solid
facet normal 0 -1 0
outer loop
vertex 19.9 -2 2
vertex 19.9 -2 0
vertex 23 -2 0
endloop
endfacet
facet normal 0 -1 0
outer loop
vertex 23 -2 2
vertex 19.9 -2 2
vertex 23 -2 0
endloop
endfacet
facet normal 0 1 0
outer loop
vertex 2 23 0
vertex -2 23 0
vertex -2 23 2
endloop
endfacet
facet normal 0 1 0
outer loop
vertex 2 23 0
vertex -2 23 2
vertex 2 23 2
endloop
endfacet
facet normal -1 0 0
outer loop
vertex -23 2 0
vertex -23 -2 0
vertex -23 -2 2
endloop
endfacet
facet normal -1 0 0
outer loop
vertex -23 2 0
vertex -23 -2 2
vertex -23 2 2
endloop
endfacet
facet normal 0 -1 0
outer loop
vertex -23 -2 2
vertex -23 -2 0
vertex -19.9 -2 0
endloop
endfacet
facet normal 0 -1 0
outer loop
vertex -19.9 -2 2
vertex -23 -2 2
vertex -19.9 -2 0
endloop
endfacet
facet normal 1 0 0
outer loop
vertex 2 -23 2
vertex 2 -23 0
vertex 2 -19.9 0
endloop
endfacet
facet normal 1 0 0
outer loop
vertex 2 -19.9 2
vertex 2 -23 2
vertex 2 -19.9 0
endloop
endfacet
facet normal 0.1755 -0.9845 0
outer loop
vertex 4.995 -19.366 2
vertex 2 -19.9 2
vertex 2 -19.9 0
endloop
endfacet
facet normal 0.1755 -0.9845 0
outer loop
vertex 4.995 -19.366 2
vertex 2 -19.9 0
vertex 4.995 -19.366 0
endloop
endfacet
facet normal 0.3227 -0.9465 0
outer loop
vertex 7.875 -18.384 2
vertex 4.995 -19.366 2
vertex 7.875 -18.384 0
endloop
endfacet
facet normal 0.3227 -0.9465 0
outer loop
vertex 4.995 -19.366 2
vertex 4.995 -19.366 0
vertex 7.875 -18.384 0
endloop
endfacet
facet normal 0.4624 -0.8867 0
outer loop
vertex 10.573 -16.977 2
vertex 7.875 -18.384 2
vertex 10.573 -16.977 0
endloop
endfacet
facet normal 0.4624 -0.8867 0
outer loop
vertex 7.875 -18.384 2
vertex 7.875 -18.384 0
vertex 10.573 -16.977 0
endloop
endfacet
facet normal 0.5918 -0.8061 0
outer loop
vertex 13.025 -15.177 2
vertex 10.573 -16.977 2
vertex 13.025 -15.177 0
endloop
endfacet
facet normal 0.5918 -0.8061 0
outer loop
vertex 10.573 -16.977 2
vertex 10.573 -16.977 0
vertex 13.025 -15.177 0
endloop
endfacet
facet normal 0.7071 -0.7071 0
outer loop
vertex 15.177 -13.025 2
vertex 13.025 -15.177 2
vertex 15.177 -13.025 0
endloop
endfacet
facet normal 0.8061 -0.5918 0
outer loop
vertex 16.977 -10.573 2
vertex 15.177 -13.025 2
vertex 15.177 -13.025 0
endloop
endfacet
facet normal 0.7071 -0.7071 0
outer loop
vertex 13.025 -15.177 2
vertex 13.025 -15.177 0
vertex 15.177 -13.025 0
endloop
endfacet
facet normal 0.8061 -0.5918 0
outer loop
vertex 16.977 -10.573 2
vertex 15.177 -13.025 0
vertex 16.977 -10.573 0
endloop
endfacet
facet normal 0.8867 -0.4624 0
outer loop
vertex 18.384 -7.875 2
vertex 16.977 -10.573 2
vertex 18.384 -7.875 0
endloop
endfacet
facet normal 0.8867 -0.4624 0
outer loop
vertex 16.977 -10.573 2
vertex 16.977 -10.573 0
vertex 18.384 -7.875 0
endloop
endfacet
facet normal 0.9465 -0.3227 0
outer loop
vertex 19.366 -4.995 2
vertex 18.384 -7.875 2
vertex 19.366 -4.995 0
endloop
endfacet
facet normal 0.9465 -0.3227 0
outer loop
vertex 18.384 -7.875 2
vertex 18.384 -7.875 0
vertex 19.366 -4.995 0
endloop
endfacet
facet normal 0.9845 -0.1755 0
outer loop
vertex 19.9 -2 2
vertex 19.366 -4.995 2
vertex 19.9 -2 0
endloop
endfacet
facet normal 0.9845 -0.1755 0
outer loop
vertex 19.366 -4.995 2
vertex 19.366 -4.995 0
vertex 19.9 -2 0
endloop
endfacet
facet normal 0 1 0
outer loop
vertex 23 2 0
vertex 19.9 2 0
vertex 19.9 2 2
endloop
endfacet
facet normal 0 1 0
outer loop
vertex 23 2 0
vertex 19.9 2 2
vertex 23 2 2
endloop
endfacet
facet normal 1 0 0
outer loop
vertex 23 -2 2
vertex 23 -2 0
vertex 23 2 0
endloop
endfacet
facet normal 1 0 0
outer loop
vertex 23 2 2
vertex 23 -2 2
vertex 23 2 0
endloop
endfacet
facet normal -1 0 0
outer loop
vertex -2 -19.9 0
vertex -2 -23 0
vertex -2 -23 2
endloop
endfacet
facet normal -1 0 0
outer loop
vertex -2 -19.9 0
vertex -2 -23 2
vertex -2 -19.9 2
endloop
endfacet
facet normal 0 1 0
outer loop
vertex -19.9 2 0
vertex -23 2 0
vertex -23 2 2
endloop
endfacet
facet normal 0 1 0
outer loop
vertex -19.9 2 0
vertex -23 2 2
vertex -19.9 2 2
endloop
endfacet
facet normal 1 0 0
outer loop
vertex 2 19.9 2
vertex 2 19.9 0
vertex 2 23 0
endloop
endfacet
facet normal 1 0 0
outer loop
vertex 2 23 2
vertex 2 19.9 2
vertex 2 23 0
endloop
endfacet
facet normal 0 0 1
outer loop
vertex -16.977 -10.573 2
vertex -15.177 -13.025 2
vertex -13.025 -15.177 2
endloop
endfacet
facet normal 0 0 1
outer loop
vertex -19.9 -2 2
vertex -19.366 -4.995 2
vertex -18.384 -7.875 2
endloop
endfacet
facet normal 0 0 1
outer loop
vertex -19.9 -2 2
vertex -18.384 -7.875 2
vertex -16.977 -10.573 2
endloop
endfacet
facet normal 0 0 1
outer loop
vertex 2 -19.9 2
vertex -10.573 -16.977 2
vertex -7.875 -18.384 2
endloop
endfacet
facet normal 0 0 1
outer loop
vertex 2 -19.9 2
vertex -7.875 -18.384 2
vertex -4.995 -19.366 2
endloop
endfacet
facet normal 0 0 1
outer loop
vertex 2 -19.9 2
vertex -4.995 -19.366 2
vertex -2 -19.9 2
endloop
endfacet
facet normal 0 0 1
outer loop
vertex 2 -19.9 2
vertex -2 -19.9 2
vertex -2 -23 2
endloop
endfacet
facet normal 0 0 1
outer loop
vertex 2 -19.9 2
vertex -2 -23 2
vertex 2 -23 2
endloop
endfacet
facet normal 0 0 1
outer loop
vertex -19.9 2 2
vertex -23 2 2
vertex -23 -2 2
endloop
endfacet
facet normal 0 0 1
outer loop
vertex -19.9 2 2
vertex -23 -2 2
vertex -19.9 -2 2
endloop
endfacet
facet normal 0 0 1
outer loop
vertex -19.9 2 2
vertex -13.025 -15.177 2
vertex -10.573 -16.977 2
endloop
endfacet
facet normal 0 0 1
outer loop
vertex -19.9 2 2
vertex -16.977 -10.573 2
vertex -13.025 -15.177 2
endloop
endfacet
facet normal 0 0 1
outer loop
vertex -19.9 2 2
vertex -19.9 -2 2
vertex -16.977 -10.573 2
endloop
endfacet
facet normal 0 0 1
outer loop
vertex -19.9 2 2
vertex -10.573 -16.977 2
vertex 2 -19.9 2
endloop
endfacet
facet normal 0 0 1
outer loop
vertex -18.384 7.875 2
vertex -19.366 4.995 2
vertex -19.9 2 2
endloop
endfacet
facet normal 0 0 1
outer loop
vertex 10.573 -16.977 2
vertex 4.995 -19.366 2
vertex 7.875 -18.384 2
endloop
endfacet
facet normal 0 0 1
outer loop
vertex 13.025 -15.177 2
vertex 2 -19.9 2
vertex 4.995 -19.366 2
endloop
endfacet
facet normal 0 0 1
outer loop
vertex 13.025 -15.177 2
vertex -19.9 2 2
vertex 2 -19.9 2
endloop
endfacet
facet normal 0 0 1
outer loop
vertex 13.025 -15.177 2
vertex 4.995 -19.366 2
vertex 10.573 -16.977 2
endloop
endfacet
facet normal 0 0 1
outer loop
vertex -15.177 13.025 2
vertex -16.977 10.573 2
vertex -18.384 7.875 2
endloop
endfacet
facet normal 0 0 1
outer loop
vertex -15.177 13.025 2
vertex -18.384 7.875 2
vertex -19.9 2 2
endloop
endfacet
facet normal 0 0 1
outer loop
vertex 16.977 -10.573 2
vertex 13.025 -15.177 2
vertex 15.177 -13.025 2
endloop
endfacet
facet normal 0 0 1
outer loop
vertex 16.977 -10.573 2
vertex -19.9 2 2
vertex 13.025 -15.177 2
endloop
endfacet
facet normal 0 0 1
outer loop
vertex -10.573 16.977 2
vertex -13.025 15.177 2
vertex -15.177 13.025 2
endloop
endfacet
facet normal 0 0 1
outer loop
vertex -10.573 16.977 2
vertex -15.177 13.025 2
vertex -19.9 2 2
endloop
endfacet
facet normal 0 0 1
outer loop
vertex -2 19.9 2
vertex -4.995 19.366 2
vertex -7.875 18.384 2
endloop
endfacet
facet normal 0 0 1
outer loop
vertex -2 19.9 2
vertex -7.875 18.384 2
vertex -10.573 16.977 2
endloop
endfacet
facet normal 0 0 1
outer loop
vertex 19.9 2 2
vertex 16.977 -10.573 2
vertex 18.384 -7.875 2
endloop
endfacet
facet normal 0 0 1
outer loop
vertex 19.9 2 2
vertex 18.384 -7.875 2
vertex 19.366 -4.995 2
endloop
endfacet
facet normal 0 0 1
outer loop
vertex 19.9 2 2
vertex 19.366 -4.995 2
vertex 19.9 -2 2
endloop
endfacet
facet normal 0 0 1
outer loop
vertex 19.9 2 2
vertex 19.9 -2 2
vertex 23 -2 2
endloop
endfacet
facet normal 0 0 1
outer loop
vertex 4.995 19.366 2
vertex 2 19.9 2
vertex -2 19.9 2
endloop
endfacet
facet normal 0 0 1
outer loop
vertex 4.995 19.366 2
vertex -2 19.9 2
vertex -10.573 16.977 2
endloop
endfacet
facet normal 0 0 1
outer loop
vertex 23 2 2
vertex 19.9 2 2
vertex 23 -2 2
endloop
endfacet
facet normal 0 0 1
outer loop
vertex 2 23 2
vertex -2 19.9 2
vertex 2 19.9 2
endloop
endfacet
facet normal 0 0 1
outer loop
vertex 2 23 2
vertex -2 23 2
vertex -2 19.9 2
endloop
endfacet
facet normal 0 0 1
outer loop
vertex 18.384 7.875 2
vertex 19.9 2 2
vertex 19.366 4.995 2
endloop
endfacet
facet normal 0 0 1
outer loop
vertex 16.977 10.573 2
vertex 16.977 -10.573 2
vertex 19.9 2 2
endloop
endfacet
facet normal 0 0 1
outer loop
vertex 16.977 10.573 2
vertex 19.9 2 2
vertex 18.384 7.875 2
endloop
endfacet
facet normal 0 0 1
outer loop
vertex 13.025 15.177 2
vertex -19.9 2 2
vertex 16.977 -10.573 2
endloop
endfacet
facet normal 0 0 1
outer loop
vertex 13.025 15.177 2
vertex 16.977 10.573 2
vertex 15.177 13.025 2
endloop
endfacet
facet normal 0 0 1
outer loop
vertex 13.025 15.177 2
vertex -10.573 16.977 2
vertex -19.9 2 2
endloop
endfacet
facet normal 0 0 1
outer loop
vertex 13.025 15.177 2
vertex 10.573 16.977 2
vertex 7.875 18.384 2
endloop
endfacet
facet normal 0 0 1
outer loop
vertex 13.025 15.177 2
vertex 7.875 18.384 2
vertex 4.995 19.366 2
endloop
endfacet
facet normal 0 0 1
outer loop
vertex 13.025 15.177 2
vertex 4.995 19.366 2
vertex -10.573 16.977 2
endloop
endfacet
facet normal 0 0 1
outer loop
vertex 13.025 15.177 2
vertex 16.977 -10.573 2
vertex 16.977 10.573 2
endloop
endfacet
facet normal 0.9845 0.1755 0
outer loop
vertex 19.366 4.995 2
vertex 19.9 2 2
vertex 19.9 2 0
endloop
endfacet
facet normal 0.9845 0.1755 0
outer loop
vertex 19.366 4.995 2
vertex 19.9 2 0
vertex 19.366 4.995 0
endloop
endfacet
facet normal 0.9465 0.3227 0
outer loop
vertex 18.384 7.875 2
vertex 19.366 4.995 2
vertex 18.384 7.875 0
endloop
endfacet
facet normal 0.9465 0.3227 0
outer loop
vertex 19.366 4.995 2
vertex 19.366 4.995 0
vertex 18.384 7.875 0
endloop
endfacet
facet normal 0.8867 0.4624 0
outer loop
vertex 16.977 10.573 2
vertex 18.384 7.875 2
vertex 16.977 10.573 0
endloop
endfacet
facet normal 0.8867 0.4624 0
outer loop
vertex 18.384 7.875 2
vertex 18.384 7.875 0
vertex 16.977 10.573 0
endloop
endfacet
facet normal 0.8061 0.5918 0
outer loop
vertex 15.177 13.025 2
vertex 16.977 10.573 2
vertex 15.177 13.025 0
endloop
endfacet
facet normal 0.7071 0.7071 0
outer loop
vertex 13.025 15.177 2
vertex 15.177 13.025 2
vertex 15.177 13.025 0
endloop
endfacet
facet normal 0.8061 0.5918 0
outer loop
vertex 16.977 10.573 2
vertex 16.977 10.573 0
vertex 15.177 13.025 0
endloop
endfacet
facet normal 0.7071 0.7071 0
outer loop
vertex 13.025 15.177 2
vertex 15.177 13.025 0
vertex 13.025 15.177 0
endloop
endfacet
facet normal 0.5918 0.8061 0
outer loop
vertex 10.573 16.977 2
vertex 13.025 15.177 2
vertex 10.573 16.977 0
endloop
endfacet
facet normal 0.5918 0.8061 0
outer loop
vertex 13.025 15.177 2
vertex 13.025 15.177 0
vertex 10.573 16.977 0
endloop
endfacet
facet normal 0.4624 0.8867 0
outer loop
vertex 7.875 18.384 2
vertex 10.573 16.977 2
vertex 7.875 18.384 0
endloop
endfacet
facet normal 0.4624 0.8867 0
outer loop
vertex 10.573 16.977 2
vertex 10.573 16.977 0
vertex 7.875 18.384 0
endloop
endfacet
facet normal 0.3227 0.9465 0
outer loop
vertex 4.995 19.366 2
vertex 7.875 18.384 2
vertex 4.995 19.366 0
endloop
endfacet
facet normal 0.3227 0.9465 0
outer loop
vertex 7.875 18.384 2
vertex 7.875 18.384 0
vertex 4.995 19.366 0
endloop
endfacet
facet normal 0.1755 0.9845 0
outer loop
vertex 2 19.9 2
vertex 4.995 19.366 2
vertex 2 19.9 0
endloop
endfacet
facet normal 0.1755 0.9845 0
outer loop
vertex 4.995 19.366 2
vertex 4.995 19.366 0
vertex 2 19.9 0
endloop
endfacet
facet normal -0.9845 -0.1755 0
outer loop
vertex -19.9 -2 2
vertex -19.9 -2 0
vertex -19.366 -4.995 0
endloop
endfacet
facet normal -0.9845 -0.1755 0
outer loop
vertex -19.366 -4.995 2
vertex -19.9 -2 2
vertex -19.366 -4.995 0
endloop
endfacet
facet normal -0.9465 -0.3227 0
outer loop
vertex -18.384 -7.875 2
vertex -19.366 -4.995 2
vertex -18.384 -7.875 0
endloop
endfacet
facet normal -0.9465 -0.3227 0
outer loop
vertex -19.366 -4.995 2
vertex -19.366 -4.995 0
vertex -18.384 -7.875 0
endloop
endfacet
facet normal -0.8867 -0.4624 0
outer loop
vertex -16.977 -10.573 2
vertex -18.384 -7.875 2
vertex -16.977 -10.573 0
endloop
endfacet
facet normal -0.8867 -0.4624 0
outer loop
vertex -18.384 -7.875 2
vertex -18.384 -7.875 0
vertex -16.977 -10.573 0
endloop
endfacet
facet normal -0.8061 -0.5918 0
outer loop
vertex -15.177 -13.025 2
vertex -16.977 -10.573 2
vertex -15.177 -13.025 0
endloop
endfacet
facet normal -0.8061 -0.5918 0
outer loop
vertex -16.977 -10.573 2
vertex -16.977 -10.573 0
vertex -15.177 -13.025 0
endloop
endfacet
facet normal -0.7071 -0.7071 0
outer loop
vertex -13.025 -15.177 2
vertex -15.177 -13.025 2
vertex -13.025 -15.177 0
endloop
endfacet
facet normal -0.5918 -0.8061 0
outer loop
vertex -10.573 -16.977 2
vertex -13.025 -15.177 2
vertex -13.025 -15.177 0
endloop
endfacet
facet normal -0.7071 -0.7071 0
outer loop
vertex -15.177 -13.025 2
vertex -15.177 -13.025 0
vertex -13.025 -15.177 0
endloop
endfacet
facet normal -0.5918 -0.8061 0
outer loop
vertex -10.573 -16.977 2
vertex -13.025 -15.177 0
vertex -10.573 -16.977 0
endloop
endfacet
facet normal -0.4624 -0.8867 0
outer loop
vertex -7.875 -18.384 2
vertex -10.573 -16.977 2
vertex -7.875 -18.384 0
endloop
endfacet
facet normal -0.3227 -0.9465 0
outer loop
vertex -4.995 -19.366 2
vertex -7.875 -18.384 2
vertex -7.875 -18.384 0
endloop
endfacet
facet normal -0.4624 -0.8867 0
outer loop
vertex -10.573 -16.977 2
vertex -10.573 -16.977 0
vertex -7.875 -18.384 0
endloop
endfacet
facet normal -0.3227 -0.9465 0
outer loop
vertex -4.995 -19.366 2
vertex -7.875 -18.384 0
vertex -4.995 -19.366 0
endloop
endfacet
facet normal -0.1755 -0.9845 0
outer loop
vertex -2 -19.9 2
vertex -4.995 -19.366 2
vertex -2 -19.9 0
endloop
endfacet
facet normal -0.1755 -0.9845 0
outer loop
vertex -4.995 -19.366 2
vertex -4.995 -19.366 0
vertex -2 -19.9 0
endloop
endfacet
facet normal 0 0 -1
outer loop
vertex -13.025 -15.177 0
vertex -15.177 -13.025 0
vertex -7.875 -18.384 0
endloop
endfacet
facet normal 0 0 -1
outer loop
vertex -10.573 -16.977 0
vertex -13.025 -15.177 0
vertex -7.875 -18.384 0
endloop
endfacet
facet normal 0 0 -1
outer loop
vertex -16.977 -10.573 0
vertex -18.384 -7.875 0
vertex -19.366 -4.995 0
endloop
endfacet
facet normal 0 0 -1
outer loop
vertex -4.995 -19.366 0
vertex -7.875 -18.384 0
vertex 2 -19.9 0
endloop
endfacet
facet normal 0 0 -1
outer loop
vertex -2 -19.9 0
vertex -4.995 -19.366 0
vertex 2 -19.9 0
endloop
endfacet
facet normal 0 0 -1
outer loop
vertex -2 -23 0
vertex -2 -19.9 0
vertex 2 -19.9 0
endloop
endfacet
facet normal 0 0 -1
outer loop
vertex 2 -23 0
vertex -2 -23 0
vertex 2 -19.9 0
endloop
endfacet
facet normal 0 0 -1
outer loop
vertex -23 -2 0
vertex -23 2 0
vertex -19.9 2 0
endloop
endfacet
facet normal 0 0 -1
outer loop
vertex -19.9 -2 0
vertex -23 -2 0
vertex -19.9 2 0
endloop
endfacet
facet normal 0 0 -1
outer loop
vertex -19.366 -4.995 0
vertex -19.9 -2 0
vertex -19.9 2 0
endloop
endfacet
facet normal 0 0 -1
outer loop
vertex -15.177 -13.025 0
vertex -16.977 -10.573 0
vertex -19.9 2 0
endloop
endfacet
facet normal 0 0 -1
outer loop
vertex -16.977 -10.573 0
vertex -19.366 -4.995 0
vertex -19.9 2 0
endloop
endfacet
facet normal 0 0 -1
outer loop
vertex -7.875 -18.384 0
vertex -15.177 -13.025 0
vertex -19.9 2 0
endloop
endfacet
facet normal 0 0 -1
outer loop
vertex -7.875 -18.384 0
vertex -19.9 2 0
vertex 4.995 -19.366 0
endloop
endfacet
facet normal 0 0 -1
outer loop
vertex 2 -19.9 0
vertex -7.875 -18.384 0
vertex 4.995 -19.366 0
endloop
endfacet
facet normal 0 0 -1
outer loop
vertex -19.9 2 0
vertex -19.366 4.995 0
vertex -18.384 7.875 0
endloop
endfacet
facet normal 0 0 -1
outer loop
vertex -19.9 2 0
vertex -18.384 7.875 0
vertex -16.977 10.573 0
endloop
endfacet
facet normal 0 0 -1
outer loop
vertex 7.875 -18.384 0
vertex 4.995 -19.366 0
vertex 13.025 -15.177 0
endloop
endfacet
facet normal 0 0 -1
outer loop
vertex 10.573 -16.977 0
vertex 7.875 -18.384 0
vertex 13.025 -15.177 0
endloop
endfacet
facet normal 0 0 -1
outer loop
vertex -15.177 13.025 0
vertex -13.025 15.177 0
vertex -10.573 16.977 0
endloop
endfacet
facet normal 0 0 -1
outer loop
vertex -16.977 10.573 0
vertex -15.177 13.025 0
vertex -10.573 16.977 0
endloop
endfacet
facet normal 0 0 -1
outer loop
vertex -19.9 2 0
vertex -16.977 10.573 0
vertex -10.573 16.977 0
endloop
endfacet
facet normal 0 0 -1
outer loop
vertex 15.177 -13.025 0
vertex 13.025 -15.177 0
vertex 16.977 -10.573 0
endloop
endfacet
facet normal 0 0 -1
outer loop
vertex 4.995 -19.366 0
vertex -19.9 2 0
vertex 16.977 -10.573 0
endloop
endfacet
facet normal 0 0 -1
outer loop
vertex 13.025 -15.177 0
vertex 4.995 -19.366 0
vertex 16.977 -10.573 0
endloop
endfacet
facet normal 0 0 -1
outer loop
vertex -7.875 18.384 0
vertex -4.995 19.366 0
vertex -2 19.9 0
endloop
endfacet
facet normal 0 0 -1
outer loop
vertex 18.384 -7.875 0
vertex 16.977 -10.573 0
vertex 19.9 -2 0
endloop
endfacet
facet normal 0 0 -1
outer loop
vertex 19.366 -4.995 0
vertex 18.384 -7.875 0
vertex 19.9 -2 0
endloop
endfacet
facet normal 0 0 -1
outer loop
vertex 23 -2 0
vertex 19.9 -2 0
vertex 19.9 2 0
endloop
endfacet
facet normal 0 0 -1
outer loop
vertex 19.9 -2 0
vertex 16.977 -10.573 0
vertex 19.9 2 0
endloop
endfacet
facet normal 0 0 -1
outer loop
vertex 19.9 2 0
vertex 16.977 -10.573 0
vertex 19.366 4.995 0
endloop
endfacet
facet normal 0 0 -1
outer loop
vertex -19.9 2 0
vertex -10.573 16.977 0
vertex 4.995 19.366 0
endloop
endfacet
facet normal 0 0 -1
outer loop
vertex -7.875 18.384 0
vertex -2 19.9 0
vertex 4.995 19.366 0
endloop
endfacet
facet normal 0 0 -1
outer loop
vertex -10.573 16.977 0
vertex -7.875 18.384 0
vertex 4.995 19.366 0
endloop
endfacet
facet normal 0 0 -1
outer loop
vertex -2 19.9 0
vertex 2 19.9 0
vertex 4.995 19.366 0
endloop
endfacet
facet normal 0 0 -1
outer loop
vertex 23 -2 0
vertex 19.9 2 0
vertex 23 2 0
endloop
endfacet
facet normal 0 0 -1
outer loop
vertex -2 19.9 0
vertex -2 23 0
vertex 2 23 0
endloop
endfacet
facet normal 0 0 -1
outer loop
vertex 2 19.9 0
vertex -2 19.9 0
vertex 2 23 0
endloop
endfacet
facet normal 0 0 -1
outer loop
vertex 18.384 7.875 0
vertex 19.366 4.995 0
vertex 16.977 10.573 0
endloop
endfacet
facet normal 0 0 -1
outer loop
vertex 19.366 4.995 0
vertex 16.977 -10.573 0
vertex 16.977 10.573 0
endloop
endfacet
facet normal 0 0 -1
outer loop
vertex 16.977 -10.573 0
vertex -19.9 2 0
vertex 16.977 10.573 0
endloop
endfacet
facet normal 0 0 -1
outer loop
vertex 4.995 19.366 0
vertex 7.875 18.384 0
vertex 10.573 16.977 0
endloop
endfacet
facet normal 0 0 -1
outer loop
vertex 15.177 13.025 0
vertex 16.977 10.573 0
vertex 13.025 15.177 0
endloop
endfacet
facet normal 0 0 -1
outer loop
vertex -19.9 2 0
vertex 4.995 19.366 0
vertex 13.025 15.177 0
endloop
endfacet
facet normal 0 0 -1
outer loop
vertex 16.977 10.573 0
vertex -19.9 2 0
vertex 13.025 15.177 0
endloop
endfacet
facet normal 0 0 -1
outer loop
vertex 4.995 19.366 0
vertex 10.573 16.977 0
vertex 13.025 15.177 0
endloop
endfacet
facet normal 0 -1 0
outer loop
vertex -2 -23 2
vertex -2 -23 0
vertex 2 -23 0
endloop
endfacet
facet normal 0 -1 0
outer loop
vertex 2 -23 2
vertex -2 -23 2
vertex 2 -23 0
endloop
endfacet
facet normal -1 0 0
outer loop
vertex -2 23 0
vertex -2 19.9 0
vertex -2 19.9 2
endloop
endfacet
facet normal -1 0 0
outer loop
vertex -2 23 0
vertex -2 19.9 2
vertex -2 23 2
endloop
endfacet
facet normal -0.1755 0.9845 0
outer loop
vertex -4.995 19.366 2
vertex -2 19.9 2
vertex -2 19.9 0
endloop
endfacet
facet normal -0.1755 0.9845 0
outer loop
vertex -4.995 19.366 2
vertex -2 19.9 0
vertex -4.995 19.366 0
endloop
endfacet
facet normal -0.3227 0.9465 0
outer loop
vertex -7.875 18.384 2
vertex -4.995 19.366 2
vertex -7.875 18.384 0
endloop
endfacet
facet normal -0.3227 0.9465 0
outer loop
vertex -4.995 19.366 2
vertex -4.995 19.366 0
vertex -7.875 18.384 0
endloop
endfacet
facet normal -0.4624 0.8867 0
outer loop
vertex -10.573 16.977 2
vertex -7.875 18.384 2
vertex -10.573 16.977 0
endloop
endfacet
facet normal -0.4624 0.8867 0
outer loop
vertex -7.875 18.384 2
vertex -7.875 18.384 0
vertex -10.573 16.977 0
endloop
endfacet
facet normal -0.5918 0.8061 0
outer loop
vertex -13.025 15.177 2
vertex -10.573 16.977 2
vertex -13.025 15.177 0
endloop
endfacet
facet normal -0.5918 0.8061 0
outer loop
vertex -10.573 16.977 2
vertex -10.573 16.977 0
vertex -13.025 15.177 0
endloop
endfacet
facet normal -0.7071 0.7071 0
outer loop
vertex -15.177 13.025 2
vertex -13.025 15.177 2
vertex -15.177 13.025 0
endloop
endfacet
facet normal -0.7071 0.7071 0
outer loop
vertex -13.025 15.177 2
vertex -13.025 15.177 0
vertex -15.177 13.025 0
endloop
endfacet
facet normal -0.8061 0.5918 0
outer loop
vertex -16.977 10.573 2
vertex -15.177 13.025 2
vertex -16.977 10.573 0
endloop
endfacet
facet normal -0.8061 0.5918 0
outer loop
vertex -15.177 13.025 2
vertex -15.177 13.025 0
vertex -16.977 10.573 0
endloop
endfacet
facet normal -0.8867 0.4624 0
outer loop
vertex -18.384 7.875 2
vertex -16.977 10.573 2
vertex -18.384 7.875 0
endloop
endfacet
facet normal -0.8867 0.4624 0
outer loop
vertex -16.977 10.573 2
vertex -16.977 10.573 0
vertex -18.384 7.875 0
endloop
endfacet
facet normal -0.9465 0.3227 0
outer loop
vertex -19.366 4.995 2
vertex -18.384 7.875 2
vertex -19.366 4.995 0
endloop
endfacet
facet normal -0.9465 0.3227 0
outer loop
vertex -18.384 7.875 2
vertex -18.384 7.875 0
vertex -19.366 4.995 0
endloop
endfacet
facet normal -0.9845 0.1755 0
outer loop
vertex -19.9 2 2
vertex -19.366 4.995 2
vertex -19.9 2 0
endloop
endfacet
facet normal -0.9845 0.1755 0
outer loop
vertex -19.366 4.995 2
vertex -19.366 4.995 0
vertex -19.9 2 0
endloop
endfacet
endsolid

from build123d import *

# Parameters (mm, degrees)
SKETCH_1_R      = 20
EXTRUDE_1_DEPTH = 2
SKETCH_2_W      = 4
SKETCH_2_H      = 4
EXTRUDE_2_DEPTH = 2


with BuildPart() as part:
    # 草图1 → 凸台-拉伸1 (new body)
    with BuildSketch(Plane.XY):
        Circle(SKETCH_1_R)
    extrude(amount=EXTRUDE_1_DEPTH)

    # 草图2 → 凸台-拉伸2 (add)
    with BuildSketch(Plane.XY):
        with Locations((21, 0)):
            Rectangle(SKETCH_2_W, SKETCH_2_H)
        with Locations((0, 21)):
            Rectangle(SKETCH_2_W, SKETCH_2_H)
        with Locations((-21, 0)):
            Rectangle(SKETCH_2_W, SKETCH_2_H)
        with Locations((0, -21)):
            Rectangle(SKETCH_2_W, SKETCH_2_H)
    extrude(amount=EXTRUDE_2_DEPTH)


solid = part.part
